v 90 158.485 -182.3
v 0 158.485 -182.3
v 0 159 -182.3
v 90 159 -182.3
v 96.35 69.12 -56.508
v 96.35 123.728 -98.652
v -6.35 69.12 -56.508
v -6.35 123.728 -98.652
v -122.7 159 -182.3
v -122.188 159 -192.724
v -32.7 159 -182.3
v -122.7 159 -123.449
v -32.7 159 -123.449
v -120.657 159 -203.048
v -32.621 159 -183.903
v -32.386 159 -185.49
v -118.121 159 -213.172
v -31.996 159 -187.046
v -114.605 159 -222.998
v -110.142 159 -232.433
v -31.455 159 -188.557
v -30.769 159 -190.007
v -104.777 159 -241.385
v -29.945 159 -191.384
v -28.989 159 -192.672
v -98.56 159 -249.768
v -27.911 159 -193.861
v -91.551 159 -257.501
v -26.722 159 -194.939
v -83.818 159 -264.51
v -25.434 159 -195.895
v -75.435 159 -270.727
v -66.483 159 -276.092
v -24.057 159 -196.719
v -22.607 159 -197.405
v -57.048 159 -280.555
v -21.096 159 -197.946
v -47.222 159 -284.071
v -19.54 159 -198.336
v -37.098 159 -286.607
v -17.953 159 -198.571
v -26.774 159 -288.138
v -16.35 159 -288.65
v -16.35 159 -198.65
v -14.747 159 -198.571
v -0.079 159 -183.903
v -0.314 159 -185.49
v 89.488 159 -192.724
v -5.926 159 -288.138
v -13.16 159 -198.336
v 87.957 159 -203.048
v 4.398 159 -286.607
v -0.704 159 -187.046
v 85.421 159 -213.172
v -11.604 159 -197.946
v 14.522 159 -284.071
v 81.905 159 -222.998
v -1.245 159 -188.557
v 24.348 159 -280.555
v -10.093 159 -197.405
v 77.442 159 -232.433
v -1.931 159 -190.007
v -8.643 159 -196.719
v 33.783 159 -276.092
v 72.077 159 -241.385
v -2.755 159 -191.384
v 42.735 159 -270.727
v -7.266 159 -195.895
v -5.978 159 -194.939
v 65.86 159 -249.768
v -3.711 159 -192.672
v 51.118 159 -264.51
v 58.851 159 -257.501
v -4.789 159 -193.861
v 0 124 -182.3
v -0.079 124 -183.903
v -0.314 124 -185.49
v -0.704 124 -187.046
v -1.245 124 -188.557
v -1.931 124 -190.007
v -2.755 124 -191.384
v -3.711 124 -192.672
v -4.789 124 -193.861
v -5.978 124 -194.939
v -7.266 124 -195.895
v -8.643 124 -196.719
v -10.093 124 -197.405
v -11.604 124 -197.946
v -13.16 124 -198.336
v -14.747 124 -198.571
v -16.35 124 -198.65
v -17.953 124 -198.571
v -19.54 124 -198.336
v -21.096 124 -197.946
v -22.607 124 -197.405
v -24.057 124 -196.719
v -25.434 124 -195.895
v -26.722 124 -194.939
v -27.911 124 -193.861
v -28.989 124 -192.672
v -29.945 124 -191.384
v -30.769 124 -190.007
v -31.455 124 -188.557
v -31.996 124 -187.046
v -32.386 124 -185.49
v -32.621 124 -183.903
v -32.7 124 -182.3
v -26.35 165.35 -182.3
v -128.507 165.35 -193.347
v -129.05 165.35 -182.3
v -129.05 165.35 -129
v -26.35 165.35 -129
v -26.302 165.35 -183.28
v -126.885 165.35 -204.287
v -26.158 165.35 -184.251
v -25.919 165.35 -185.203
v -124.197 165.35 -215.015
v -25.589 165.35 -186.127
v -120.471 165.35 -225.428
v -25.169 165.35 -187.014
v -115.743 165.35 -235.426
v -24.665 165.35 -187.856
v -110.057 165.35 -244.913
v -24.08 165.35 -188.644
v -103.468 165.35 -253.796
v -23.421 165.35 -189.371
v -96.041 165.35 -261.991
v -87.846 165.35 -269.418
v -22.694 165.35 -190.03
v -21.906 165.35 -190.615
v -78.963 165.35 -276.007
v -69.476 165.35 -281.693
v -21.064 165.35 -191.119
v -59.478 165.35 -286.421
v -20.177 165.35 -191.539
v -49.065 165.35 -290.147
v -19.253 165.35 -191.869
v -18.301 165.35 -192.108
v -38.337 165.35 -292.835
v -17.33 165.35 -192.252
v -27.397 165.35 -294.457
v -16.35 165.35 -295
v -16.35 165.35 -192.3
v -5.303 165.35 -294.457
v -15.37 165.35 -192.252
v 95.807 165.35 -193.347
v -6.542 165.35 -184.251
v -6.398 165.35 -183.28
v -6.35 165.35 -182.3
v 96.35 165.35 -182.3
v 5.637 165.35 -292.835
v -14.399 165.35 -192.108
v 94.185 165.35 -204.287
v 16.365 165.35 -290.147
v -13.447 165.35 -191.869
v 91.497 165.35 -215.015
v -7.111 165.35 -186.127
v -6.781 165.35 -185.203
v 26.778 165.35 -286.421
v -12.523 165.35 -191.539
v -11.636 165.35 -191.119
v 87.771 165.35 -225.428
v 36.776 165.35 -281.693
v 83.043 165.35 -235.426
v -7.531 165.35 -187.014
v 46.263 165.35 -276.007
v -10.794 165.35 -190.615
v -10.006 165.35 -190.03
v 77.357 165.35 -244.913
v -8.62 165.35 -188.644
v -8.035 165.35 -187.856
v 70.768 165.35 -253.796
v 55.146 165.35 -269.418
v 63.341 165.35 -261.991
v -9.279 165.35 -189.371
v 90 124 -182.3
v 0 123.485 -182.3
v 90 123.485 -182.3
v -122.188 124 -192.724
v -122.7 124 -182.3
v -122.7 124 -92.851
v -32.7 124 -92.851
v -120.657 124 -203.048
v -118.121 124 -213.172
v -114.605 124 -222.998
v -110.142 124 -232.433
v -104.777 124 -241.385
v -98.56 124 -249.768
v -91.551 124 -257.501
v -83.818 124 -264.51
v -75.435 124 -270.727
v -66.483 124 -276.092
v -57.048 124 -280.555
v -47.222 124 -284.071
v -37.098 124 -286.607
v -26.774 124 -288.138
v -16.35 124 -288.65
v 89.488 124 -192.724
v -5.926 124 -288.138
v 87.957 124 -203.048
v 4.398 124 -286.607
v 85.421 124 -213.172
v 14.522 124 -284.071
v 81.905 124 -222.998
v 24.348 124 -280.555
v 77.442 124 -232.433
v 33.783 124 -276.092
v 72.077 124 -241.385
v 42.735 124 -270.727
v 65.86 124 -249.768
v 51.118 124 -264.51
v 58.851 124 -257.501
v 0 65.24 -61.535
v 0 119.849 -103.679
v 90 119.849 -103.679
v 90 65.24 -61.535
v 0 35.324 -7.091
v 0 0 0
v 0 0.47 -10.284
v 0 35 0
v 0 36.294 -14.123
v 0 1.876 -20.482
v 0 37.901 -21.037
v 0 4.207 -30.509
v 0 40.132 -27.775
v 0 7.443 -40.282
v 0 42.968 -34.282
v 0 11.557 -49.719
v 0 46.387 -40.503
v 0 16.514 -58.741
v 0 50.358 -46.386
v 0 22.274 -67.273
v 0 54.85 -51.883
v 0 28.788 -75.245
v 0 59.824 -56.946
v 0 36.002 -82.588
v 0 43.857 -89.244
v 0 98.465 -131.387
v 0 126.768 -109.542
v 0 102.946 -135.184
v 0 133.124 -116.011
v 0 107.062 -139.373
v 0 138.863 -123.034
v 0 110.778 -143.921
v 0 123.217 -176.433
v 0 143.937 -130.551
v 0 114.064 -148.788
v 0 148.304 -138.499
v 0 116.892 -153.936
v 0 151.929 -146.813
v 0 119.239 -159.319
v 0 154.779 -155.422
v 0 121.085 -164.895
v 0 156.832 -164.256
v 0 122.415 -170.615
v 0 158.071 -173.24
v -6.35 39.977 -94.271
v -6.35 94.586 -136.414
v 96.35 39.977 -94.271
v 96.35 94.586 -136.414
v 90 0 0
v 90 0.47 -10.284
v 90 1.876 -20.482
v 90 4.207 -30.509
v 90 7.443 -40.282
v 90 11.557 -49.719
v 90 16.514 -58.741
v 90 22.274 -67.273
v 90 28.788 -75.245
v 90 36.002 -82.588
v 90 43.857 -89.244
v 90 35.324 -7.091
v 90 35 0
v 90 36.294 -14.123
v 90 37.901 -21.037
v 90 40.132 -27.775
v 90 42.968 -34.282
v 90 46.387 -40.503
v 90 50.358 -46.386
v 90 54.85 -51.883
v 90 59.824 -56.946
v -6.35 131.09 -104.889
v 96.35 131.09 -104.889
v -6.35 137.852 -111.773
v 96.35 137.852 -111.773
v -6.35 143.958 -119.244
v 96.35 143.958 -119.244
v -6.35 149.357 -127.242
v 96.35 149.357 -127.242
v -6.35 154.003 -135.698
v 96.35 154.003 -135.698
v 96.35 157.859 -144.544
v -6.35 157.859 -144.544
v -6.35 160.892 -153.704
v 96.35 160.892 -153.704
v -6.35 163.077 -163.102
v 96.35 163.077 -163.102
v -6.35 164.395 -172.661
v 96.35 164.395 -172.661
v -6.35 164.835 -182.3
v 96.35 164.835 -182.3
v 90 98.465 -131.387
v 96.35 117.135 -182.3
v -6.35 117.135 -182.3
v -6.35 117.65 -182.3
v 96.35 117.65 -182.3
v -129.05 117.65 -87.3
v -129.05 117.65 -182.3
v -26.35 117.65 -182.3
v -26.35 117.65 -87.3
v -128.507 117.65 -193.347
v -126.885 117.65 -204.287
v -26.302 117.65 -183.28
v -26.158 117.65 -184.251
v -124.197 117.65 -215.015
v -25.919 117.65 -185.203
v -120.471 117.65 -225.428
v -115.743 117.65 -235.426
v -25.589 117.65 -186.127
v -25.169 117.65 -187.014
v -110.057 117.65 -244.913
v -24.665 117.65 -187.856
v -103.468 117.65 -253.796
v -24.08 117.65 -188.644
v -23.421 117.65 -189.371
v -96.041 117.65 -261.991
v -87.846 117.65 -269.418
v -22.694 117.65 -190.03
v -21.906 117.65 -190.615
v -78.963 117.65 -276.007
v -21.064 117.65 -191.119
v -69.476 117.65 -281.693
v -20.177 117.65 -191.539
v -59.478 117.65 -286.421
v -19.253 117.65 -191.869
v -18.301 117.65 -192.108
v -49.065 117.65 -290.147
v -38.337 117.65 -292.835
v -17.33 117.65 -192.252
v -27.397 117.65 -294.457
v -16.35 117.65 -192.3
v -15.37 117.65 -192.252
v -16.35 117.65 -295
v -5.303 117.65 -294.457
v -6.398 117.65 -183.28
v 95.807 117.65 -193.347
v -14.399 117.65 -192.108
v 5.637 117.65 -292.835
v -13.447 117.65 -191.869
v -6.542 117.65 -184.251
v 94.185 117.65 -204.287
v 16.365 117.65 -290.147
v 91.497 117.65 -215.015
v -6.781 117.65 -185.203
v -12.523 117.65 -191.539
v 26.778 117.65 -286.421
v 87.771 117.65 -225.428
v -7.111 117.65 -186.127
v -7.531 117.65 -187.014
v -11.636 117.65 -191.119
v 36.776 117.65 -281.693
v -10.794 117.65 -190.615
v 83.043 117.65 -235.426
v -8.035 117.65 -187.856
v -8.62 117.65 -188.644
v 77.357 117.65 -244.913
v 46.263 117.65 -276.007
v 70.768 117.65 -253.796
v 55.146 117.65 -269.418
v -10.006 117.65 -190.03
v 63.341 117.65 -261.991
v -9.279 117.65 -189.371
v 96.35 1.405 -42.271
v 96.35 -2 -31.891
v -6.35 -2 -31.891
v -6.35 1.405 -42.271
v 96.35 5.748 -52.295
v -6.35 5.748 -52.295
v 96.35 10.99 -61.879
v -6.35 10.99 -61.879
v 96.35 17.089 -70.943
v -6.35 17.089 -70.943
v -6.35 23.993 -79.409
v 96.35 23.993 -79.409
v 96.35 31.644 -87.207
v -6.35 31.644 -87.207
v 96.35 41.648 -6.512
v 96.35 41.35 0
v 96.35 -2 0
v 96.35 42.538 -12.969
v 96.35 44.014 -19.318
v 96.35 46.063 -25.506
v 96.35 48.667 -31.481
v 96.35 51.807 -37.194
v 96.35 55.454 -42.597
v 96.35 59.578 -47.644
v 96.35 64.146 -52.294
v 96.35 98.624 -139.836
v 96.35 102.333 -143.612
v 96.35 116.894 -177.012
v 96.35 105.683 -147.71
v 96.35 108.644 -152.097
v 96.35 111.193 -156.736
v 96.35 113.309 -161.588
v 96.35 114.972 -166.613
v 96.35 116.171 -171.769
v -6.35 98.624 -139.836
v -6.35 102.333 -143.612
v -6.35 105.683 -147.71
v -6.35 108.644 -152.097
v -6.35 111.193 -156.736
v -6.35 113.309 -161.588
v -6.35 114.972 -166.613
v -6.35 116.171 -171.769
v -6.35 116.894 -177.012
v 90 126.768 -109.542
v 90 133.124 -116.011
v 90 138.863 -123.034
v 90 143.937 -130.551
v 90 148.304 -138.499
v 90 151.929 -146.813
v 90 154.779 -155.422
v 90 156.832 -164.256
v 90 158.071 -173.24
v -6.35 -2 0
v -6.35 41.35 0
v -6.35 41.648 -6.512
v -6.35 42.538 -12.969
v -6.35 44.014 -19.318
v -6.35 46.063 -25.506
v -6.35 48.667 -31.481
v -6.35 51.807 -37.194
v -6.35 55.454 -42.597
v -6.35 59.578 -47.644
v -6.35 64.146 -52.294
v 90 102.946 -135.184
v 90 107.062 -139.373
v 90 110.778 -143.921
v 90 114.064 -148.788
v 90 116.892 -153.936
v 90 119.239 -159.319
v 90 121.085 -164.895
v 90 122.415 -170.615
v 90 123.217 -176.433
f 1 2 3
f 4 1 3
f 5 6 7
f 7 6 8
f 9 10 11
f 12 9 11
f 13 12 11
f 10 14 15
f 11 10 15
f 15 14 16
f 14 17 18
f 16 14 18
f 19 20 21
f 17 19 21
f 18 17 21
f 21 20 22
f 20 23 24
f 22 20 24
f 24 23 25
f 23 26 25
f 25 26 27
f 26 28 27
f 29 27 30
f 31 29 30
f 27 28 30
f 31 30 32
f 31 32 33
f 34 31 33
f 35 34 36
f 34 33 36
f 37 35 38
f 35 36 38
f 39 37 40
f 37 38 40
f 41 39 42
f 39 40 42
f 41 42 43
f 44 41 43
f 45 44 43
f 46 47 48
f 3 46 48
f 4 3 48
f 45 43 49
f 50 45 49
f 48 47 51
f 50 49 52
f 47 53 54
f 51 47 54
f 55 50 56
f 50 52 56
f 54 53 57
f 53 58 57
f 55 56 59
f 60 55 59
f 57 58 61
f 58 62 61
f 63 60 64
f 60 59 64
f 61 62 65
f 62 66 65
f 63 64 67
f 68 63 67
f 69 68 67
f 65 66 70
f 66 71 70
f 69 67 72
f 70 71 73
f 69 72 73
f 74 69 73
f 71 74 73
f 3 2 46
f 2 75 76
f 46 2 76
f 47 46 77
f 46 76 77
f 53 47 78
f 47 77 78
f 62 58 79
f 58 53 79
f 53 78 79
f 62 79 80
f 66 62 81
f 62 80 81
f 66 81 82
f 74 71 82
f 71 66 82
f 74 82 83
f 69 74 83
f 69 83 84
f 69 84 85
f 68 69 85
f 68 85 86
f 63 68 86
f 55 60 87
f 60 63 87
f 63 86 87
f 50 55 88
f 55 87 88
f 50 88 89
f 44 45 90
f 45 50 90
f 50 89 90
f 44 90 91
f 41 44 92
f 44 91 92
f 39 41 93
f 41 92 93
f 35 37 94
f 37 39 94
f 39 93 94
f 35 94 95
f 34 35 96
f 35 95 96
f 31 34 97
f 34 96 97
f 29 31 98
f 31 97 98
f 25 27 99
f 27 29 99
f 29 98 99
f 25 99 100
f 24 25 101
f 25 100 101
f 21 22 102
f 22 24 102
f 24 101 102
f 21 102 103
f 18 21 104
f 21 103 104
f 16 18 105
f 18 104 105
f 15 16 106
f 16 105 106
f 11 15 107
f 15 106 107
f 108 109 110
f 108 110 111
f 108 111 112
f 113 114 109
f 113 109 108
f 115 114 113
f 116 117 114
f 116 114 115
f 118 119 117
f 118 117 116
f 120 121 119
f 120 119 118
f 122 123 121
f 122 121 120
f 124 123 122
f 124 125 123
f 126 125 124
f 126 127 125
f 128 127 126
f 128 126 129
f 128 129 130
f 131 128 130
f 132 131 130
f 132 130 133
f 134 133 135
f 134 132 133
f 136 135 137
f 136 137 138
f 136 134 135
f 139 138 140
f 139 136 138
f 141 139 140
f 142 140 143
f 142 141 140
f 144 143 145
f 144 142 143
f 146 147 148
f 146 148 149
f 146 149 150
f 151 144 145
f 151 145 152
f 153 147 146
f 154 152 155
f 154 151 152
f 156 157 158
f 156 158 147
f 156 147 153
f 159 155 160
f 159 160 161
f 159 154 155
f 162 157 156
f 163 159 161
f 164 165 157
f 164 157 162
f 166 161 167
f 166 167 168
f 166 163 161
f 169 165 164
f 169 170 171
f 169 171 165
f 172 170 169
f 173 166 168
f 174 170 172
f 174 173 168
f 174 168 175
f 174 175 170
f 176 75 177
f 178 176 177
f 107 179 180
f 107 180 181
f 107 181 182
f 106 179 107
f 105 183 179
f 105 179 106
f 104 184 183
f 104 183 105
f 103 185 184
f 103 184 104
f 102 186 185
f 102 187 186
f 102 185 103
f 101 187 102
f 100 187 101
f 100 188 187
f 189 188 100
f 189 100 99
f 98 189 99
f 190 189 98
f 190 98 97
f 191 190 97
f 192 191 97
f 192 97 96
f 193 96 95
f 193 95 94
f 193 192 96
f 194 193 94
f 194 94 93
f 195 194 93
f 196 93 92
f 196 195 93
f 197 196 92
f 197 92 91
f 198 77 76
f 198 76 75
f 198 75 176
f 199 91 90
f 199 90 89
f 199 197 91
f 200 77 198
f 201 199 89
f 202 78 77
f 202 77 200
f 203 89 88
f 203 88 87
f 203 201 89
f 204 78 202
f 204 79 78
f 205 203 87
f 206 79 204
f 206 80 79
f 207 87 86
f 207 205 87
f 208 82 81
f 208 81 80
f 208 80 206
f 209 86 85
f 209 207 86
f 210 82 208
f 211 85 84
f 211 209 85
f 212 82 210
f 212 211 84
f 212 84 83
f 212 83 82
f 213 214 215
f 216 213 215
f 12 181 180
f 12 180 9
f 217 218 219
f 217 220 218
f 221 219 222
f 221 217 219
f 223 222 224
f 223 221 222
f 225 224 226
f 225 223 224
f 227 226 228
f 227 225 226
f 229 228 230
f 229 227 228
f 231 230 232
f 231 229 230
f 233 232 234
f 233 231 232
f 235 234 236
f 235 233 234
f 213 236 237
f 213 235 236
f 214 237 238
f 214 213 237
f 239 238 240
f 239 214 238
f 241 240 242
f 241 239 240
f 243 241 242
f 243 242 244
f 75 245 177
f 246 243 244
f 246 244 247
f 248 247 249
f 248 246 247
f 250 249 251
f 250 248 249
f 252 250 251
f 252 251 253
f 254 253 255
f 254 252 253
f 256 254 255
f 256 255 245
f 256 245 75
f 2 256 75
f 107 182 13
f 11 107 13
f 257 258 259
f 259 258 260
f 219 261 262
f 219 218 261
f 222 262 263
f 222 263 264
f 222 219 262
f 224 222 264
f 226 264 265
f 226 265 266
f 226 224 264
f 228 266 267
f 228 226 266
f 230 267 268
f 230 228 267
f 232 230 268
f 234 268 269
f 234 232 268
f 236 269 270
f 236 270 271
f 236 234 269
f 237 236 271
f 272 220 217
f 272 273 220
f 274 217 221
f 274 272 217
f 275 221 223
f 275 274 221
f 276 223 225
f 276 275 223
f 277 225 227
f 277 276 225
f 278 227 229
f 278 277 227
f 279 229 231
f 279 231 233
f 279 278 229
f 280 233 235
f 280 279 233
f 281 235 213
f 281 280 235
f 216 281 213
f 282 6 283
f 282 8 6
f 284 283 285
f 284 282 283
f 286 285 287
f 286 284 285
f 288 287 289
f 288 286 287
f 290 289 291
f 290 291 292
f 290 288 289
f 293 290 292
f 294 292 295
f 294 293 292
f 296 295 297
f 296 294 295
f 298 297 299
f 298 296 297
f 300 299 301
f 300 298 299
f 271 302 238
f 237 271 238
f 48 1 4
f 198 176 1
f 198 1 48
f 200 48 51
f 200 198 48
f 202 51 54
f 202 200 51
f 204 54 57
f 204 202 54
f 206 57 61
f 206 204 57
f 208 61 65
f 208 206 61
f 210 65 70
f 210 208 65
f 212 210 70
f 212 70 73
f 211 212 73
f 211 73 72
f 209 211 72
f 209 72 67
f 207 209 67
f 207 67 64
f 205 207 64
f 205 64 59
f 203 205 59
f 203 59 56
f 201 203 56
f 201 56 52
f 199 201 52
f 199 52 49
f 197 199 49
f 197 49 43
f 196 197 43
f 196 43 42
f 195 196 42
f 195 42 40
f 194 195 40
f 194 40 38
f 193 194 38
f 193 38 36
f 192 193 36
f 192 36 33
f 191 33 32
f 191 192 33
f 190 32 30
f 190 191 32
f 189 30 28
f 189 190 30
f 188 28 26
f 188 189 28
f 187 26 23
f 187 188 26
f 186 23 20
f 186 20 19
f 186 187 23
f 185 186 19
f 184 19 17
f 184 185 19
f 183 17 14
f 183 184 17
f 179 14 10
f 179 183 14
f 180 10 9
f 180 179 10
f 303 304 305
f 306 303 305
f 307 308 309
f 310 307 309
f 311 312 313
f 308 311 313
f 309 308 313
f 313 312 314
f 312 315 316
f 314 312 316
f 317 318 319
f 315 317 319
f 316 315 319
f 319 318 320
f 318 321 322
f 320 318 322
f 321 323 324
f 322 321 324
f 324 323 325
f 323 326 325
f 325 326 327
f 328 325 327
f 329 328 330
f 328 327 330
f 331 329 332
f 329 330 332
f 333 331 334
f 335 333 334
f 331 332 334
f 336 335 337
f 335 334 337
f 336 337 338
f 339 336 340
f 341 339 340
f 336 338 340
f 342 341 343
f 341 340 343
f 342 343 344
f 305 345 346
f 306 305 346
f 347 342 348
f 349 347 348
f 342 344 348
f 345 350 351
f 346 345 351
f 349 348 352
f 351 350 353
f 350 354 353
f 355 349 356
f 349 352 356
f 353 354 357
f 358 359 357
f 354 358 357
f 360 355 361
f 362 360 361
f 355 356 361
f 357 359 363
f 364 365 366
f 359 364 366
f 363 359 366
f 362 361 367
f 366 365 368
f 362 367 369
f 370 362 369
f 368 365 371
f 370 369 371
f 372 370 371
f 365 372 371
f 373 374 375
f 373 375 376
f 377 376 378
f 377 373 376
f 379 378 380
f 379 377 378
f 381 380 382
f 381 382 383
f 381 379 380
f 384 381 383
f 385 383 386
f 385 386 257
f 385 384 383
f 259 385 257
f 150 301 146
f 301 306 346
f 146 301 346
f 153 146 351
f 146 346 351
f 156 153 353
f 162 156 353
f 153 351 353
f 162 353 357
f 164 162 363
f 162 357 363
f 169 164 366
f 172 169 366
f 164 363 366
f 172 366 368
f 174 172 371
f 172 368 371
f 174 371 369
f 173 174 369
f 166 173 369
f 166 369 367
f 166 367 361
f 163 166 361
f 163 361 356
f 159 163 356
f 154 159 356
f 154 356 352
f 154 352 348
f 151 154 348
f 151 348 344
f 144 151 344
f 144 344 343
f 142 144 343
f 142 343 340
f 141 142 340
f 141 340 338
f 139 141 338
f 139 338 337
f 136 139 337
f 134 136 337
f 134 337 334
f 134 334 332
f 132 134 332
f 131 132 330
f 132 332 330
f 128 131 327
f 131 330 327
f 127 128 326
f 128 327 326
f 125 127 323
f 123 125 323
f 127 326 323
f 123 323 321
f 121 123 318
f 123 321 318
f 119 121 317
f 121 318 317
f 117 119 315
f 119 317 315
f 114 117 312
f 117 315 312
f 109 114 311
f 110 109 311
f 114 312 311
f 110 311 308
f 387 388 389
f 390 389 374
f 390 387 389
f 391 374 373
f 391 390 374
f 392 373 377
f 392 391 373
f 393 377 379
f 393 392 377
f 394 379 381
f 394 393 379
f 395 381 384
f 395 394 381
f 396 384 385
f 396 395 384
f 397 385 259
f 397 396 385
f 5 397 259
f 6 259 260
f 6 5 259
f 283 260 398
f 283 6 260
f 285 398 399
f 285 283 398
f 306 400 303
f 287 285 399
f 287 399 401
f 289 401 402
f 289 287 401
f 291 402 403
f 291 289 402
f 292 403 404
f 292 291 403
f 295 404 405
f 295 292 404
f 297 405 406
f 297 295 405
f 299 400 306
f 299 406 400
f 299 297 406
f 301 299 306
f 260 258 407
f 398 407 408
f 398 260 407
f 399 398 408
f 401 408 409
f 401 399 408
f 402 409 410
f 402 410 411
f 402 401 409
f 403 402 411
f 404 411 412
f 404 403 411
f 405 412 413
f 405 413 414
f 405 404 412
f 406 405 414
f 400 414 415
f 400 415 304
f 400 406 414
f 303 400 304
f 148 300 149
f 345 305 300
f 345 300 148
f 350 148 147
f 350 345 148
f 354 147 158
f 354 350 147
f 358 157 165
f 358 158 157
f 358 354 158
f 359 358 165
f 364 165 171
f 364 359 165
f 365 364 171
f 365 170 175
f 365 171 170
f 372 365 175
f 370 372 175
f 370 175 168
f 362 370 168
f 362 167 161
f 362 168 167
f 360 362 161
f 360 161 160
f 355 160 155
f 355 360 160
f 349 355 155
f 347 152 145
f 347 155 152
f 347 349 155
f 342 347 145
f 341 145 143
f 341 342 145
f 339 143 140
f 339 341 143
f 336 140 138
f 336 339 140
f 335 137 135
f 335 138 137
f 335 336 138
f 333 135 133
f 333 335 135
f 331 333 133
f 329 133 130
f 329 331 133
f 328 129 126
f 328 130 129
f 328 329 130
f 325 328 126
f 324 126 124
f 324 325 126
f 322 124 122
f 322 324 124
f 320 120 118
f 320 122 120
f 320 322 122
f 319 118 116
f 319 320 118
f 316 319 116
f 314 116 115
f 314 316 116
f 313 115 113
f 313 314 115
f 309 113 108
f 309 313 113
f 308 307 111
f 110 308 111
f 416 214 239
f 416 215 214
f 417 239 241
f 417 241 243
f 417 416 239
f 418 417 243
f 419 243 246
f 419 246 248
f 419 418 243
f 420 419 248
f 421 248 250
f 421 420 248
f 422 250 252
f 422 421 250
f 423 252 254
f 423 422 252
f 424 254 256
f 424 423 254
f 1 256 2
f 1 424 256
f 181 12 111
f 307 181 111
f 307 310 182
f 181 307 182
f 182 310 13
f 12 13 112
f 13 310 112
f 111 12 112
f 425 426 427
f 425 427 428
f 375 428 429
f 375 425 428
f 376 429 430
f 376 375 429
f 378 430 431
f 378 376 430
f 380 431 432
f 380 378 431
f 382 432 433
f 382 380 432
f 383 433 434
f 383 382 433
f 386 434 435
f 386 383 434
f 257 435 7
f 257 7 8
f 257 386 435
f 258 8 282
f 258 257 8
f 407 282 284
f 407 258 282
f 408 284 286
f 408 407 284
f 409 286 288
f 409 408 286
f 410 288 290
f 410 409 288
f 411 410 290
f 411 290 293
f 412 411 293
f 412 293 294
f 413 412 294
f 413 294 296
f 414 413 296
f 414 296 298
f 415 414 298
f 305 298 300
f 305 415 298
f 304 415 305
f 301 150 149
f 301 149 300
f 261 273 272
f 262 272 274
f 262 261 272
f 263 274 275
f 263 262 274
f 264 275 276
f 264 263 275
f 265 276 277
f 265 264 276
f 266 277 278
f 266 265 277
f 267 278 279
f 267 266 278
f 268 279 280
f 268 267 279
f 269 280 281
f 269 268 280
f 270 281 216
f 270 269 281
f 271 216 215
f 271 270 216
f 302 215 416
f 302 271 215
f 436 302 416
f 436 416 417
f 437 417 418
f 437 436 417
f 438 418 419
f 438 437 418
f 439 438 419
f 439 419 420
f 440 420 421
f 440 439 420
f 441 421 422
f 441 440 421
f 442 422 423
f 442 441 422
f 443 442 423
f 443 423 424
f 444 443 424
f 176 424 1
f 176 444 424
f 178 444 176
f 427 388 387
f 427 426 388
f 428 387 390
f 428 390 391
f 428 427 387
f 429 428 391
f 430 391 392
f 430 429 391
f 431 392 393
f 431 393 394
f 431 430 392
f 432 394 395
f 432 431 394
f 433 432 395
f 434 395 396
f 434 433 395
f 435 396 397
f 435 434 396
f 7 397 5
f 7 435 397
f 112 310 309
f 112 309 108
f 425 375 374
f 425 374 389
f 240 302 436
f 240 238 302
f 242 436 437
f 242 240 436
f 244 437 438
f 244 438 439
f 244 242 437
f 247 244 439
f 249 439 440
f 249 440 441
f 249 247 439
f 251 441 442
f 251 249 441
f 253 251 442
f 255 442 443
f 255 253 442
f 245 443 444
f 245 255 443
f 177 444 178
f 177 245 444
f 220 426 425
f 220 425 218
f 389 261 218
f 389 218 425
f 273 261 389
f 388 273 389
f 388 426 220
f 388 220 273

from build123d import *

# Parameters (mm, degrees)
SKETCH4_W                = 47.7
SKETCH4_H                = 102.7
SKETCH4_W_2              = 35
SKETCH4_H_2              = 90
REVOLVE2_ANGLE           = 90
REVOLVE2_OTHER_WAY_ANGLE = 90
SKETCH10_W               = 102.7
SKETCH10_H               = 47.7
SKETCH10_W_2             = 90
SKETCH10_H_2             = 35
BOSS_EXTRUDE1_DEPTH      = 95
CUT_EXTRUDE2_DEPTH       = 360.751181374
SKETCH1_W                = 102.7
SKETCH1_H                = 47.7
SKETCH1_W_2              = 90
SKETCH1_H_2              = 35
CUT_EXTRUDE3_DEPTH       = 407.412084589
CUT_EXTRUDE3_DEPTH_BACK  = 407.412084589


with BuildPart() as part:
    # Sketch4 → Revolve2 (revolve)
    with BuildSketch(Plane(origin=(-16.35, 0, 0), x_dir=(0, -1, 0), z_dir=(-1, 0, 0))):
        with Locations((-141.5, -243.65)):
            Rectangle(SKETCH4_W, SKETCH4_H)
        with Locations((-141.5, -243.65)):
            Rectangle(SKETCH4_W_2, SKETCH4_H_2, mode=Mode.SUBTRACT)
    revolve(axis=Axis((-16.35, 289, -182.3), (0, -1, 0)), revolution_arc=REVOLVE2_ANGLE)

    # Sketch4 → Revolve2 other way (revolve)
    with BuildSketch(Plane(origin=(-16.35, 0, 0), x_dir=(0, -1, 0), z_dir=(-1, 0, 0))):
        with Locations((-141.5, -243.65)):
            Rectangle(SKETCH4_W, SKETCH4_H)
        with Locations((-141.5, -243.65)):
            Rectangle(SKETCH4_W_2, SKETCH4_H_2, mode=Mode.SUBTRACT)
    revolve(axis=Axis((-16.35, 289, -182.3), (0, 1, 0)), revolution_arc=REVOLVE2_OTHER_WAY_ANGLE)

    # Sketch10 → Boss-Extrude1 (add)
    with BuildSketch(Plane.XY.offset(-182.3)):
        with Locations((-77.7, 141.5)):
            Rectangle(SKETCH10_W, SKETCH10_H)
        with Locations((-77.7, 141.5)):
            Rectangle(SKETCH10_W_2, SKETCH10_H_2, mode=Mode.SUBTRACT)
    extrude(amount=BOSS_EXTRUDE1_DEPTH)

    # Sketch11 → Cut-Extrude2 (cut, through all)
    with BuildSketch(Plane(origin=(-26.35, 0, 0), x_dir=(0, 0, -1), z_dir=(1, 0, 0))):
        Polygon((87.3, 165.35), (87.3, 117.65), (129, 165.35), align=None)
    extrude(amount=-CUT_EXTRUDE2_DEPTH, mode=Mode.SUBTRACT)

    # Sweep1: sweep along a path in Sketch8
    with BuildLine(Plane(origin=(-6.35, 0, 0), x_dir=(0, -1, 0), z_dir=(-1, 0, 0))) as sweep1_path:
        ThreePointArc((5.835401436, 0), (-6.319346867, -52.292435279), (-40.291475749, -93.863232155))
        Line((-40.291475749, -93.863232155), (-94.90018434, -136.006572847))
        ThreePointArc((-94.90018434, -136.006572847), (-111.65526764, -156.509325764), (-117.65, -182.3))
    # Sketch1 → Sweep1 (sweep)
    with BuildSketch(Plane.XY):
        with Locations((45, 17.5)):
            Rectangle(SKETCH1_W, SKETCH1_H)
        with Locations((45, 17.5)):
            Rectangle(SKETCH1_W_2, SKETCH1_H_2, mode=Mode.SUBTRACT)
    sweep(path=sweep1_path.line)

    # Sketch12 → Cut-Extrude3 (cut, two sides: drawn at the far end of the back side and taken through both)
    with BuildSketch(Plane(origin=(96.35, 0, 0), x_dir=(0, 0, -1), z_dir=(1, 0, 0)).offset(-CUT_EXTRUDE3_DEPTH_BACK)):
        with BuildLine():
            Line((31.891429718, -2), (0, -2))
            Line((0, -2), (0, -6.35))
            ThreePointArc((0, -6.35), (16.093366564, -5.25748827), (31.891429718, -2))
        make_face()
        with BuildLine():
            Line((73.302994761, -2), (31.891429718, -2))
            ThreePointArc((31.891429718, -2), (16.093366564, -5.25748827), (0, -6.35))
            Line((0, -6.35), (73.302994761, -6.35))
            Line((73.302994761, -6.35), (73.302994761, -2))
        make_face()
    extrude(amount=CUT_EXTRUDE3_DEPTH + CUT_EXTRUDE3_DEPTH_BACK, mode=Mode.SUBTRACT)


solid = part.part
